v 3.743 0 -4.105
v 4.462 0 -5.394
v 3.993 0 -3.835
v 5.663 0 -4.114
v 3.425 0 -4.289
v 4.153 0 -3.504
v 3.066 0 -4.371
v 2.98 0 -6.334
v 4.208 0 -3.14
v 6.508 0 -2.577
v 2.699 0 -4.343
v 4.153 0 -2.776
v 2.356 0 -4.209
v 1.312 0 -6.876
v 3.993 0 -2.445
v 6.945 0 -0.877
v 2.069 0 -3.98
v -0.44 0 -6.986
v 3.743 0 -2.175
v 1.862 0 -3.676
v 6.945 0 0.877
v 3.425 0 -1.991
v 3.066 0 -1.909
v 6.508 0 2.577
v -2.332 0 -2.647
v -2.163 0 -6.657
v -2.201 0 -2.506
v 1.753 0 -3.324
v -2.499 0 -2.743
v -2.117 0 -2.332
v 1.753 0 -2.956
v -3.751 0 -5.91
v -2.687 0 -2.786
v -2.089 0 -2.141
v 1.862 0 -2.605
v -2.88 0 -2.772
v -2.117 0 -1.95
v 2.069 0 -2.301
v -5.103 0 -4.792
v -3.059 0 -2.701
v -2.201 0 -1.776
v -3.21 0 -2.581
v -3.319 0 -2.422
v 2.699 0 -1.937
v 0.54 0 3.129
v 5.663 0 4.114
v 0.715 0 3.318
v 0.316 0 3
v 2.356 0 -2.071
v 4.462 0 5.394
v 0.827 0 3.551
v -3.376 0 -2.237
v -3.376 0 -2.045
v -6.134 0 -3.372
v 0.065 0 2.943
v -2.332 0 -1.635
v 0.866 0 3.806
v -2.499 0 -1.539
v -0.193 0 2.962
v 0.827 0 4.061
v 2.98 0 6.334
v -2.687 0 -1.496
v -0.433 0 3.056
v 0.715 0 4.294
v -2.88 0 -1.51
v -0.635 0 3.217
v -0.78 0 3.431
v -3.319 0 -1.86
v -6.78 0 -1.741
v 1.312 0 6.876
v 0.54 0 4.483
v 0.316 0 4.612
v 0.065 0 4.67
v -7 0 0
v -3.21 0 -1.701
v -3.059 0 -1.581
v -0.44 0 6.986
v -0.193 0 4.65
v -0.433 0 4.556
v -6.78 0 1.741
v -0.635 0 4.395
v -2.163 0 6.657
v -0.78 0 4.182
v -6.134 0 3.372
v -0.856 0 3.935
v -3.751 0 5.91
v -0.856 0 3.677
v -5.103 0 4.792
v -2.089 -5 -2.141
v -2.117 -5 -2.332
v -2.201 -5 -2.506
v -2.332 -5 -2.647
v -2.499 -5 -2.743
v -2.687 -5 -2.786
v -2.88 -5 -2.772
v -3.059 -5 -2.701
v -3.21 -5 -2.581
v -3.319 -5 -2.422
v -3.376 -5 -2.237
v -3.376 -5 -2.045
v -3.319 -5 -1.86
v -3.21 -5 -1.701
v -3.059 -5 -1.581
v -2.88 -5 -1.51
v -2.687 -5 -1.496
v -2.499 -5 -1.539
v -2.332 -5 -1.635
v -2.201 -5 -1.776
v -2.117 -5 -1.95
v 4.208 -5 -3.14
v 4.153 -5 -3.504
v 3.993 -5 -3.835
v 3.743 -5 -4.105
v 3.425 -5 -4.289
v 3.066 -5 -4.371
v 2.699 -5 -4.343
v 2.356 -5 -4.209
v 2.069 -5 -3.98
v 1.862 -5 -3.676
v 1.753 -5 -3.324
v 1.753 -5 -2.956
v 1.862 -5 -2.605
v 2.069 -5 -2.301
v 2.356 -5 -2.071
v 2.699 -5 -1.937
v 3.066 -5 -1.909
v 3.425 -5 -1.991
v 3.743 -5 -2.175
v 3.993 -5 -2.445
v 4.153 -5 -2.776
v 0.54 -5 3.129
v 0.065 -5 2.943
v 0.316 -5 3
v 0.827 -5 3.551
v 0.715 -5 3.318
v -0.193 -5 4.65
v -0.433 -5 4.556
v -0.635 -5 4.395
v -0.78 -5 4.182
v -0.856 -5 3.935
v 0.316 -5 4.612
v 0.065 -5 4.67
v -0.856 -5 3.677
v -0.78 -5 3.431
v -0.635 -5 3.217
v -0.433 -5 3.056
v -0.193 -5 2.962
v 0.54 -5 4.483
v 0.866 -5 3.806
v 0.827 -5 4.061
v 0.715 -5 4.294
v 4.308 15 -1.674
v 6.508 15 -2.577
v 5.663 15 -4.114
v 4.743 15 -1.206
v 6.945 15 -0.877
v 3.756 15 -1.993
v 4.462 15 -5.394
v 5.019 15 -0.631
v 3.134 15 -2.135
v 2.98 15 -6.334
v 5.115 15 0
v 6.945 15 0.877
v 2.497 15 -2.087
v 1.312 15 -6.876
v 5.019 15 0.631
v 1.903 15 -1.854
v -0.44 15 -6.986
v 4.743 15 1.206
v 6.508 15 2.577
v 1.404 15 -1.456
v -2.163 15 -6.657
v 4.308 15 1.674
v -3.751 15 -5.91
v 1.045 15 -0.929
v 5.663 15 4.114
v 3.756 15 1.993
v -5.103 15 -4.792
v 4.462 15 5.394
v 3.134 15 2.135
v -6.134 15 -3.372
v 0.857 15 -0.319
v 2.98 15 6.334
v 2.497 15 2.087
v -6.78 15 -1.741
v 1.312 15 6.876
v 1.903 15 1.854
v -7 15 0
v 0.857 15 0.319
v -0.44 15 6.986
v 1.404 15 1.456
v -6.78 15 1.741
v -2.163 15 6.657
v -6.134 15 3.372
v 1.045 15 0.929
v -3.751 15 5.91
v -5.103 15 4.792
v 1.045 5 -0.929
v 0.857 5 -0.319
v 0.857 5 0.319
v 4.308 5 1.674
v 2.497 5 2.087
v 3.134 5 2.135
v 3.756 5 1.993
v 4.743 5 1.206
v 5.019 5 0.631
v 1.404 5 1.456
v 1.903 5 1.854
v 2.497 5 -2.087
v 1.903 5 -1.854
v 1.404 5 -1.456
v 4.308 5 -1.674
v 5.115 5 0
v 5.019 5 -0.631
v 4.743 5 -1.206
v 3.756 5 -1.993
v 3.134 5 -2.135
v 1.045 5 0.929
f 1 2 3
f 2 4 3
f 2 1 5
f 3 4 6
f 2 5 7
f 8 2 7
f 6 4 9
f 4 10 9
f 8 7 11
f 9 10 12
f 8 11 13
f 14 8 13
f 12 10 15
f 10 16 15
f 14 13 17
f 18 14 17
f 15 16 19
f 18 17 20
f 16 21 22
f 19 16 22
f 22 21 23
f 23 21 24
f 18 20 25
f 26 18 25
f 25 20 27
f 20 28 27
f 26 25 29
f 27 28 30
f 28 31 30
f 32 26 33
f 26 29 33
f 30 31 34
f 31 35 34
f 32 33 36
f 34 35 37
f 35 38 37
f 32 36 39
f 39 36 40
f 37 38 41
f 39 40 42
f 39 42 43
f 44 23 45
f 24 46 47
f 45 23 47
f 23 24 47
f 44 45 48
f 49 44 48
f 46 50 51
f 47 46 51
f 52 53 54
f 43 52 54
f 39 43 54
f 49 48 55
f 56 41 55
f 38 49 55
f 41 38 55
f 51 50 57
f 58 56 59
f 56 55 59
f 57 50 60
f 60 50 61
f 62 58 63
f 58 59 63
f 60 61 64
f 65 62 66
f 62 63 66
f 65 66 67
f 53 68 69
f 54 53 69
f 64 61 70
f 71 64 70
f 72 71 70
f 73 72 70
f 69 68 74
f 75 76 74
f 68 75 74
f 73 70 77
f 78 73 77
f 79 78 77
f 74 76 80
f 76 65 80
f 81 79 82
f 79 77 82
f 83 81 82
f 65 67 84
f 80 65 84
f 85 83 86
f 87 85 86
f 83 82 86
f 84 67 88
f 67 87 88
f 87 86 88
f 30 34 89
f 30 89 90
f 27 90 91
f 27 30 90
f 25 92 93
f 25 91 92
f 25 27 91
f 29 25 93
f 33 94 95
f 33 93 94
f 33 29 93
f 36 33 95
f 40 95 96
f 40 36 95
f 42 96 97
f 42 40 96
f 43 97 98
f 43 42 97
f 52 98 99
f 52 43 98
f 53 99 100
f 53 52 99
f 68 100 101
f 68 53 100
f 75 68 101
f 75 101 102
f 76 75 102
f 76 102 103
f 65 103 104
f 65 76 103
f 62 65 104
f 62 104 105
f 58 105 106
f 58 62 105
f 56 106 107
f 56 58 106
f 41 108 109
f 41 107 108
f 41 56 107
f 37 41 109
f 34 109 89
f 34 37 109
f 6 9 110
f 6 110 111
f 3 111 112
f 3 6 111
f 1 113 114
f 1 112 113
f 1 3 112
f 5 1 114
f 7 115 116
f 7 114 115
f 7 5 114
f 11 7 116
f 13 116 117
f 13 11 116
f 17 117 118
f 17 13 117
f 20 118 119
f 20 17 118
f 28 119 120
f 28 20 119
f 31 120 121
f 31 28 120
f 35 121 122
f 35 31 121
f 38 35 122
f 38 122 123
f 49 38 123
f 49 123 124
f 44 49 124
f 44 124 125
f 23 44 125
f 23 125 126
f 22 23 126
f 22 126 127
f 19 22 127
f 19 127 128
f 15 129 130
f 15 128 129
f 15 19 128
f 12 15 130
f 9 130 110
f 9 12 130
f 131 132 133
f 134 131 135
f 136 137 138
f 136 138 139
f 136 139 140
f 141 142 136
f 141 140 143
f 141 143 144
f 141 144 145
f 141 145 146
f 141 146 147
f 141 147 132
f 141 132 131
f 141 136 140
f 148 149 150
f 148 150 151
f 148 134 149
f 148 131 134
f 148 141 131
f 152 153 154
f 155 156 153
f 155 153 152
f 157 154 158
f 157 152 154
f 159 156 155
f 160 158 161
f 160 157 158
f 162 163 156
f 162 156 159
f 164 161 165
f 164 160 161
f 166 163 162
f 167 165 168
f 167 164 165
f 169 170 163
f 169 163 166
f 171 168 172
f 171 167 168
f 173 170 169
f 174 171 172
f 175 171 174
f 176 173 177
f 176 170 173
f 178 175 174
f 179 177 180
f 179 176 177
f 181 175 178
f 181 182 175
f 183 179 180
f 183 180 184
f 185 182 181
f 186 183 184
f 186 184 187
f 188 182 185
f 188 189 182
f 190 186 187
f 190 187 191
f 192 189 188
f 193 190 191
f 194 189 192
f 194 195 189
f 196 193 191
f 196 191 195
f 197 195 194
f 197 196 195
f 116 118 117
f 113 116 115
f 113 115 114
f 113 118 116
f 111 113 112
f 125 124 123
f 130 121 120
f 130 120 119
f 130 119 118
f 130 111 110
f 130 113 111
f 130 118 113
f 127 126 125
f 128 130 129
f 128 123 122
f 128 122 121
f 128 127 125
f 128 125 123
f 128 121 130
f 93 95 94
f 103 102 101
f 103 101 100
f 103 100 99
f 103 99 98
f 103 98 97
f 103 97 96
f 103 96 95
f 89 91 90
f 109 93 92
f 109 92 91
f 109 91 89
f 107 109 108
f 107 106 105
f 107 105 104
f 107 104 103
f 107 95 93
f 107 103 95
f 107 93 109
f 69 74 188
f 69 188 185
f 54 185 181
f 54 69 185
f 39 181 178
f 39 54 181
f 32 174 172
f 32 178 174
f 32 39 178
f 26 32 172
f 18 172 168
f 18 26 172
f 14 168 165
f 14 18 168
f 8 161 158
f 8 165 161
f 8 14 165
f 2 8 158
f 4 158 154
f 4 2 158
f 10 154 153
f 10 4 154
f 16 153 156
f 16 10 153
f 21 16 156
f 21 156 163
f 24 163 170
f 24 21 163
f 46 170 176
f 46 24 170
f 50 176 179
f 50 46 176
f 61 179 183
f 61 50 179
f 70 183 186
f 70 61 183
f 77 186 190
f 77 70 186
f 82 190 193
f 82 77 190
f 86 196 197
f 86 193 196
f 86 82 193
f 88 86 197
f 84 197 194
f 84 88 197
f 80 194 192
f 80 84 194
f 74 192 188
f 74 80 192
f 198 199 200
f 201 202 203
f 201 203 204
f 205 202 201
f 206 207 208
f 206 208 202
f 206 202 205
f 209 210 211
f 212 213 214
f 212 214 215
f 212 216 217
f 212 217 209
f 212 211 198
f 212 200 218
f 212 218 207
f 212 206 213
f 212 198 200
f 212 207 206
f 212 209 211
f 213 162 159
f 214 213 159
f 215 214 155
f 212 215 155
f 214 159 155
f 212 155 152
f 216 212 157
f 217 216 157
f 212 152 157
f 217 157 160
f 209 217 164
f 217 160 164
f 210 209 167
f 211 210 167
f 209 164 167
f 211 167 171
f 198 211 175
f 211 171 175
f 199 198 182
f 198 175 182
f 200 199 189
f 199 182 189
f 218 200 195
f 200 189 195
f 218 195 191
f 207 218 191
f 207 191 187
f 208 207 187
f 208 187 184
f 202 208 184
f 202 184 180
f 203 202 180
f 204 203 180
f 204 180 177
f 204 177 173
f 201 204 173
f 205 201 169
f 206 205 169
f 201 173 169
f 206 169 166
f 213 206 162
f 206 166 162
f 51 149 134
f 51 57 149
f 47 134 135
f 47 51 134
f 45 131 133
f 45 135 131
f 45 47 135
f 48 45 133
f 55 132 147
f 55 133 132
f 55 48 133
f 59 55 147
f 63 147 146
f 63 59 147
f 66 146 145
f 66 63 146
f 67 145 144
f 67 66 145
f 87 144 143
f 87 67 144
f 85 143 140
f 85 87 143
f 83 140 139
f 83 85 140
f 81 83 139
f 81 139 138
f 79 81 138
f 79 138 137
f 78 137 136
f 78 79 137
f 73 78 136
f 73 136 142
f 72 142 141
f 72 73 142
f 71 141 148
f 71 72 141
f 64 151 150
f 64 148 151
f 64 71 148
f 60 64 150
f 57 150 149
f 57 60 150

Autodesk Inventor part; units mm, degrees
ref_plane "YZ Plane" through (0, 0, 0) normal (1, 0, 0) x (0, 1, 0)
ref_plane "XZ Plane" through (0, 0, 0) normal (0, 1, 0) x (-1, 0, 0)
ref_plane "XY Plane" through (0, 0, 0) normal (0, 0, 1) x (1, 0, 0)
sketch "Sketch1" plane through (0, 0, 0) normal (0, 1, 0) x (-1, 0, 0)
  circle A0 centre (0, 0) radius 7
  dimension "d0" = 14
extrude "Extrusion1" add sketch "Sketch1" along normal blind 15
sketch "Sketch2" plane through (0, 15, 0) normal (0, 1, 0) x (1, 0, 0)
  circle A0 centre (2.9736, 0) radius 2.141
  point P0 (0, 0)
extrude "Extrusion2" cut sketch "Sketch2" against normal blind 10
sketch "Sketch3" plane through (0, 0, 0) normal (0, -1, 0) x (1, 0, 0)
  circle A0 centre (0, 3.8062) radius 0.8659
  circle A1 centre (2.9736, -3.1401) radius 1.2343
  circle A2 centre (-2.7357, -2.141) radius 0.6471
  point P0 (0, 0)
extrude "Extrusion3" add sketch "Sketch3" along normal blind 5
properties part number "Conector de carga"
